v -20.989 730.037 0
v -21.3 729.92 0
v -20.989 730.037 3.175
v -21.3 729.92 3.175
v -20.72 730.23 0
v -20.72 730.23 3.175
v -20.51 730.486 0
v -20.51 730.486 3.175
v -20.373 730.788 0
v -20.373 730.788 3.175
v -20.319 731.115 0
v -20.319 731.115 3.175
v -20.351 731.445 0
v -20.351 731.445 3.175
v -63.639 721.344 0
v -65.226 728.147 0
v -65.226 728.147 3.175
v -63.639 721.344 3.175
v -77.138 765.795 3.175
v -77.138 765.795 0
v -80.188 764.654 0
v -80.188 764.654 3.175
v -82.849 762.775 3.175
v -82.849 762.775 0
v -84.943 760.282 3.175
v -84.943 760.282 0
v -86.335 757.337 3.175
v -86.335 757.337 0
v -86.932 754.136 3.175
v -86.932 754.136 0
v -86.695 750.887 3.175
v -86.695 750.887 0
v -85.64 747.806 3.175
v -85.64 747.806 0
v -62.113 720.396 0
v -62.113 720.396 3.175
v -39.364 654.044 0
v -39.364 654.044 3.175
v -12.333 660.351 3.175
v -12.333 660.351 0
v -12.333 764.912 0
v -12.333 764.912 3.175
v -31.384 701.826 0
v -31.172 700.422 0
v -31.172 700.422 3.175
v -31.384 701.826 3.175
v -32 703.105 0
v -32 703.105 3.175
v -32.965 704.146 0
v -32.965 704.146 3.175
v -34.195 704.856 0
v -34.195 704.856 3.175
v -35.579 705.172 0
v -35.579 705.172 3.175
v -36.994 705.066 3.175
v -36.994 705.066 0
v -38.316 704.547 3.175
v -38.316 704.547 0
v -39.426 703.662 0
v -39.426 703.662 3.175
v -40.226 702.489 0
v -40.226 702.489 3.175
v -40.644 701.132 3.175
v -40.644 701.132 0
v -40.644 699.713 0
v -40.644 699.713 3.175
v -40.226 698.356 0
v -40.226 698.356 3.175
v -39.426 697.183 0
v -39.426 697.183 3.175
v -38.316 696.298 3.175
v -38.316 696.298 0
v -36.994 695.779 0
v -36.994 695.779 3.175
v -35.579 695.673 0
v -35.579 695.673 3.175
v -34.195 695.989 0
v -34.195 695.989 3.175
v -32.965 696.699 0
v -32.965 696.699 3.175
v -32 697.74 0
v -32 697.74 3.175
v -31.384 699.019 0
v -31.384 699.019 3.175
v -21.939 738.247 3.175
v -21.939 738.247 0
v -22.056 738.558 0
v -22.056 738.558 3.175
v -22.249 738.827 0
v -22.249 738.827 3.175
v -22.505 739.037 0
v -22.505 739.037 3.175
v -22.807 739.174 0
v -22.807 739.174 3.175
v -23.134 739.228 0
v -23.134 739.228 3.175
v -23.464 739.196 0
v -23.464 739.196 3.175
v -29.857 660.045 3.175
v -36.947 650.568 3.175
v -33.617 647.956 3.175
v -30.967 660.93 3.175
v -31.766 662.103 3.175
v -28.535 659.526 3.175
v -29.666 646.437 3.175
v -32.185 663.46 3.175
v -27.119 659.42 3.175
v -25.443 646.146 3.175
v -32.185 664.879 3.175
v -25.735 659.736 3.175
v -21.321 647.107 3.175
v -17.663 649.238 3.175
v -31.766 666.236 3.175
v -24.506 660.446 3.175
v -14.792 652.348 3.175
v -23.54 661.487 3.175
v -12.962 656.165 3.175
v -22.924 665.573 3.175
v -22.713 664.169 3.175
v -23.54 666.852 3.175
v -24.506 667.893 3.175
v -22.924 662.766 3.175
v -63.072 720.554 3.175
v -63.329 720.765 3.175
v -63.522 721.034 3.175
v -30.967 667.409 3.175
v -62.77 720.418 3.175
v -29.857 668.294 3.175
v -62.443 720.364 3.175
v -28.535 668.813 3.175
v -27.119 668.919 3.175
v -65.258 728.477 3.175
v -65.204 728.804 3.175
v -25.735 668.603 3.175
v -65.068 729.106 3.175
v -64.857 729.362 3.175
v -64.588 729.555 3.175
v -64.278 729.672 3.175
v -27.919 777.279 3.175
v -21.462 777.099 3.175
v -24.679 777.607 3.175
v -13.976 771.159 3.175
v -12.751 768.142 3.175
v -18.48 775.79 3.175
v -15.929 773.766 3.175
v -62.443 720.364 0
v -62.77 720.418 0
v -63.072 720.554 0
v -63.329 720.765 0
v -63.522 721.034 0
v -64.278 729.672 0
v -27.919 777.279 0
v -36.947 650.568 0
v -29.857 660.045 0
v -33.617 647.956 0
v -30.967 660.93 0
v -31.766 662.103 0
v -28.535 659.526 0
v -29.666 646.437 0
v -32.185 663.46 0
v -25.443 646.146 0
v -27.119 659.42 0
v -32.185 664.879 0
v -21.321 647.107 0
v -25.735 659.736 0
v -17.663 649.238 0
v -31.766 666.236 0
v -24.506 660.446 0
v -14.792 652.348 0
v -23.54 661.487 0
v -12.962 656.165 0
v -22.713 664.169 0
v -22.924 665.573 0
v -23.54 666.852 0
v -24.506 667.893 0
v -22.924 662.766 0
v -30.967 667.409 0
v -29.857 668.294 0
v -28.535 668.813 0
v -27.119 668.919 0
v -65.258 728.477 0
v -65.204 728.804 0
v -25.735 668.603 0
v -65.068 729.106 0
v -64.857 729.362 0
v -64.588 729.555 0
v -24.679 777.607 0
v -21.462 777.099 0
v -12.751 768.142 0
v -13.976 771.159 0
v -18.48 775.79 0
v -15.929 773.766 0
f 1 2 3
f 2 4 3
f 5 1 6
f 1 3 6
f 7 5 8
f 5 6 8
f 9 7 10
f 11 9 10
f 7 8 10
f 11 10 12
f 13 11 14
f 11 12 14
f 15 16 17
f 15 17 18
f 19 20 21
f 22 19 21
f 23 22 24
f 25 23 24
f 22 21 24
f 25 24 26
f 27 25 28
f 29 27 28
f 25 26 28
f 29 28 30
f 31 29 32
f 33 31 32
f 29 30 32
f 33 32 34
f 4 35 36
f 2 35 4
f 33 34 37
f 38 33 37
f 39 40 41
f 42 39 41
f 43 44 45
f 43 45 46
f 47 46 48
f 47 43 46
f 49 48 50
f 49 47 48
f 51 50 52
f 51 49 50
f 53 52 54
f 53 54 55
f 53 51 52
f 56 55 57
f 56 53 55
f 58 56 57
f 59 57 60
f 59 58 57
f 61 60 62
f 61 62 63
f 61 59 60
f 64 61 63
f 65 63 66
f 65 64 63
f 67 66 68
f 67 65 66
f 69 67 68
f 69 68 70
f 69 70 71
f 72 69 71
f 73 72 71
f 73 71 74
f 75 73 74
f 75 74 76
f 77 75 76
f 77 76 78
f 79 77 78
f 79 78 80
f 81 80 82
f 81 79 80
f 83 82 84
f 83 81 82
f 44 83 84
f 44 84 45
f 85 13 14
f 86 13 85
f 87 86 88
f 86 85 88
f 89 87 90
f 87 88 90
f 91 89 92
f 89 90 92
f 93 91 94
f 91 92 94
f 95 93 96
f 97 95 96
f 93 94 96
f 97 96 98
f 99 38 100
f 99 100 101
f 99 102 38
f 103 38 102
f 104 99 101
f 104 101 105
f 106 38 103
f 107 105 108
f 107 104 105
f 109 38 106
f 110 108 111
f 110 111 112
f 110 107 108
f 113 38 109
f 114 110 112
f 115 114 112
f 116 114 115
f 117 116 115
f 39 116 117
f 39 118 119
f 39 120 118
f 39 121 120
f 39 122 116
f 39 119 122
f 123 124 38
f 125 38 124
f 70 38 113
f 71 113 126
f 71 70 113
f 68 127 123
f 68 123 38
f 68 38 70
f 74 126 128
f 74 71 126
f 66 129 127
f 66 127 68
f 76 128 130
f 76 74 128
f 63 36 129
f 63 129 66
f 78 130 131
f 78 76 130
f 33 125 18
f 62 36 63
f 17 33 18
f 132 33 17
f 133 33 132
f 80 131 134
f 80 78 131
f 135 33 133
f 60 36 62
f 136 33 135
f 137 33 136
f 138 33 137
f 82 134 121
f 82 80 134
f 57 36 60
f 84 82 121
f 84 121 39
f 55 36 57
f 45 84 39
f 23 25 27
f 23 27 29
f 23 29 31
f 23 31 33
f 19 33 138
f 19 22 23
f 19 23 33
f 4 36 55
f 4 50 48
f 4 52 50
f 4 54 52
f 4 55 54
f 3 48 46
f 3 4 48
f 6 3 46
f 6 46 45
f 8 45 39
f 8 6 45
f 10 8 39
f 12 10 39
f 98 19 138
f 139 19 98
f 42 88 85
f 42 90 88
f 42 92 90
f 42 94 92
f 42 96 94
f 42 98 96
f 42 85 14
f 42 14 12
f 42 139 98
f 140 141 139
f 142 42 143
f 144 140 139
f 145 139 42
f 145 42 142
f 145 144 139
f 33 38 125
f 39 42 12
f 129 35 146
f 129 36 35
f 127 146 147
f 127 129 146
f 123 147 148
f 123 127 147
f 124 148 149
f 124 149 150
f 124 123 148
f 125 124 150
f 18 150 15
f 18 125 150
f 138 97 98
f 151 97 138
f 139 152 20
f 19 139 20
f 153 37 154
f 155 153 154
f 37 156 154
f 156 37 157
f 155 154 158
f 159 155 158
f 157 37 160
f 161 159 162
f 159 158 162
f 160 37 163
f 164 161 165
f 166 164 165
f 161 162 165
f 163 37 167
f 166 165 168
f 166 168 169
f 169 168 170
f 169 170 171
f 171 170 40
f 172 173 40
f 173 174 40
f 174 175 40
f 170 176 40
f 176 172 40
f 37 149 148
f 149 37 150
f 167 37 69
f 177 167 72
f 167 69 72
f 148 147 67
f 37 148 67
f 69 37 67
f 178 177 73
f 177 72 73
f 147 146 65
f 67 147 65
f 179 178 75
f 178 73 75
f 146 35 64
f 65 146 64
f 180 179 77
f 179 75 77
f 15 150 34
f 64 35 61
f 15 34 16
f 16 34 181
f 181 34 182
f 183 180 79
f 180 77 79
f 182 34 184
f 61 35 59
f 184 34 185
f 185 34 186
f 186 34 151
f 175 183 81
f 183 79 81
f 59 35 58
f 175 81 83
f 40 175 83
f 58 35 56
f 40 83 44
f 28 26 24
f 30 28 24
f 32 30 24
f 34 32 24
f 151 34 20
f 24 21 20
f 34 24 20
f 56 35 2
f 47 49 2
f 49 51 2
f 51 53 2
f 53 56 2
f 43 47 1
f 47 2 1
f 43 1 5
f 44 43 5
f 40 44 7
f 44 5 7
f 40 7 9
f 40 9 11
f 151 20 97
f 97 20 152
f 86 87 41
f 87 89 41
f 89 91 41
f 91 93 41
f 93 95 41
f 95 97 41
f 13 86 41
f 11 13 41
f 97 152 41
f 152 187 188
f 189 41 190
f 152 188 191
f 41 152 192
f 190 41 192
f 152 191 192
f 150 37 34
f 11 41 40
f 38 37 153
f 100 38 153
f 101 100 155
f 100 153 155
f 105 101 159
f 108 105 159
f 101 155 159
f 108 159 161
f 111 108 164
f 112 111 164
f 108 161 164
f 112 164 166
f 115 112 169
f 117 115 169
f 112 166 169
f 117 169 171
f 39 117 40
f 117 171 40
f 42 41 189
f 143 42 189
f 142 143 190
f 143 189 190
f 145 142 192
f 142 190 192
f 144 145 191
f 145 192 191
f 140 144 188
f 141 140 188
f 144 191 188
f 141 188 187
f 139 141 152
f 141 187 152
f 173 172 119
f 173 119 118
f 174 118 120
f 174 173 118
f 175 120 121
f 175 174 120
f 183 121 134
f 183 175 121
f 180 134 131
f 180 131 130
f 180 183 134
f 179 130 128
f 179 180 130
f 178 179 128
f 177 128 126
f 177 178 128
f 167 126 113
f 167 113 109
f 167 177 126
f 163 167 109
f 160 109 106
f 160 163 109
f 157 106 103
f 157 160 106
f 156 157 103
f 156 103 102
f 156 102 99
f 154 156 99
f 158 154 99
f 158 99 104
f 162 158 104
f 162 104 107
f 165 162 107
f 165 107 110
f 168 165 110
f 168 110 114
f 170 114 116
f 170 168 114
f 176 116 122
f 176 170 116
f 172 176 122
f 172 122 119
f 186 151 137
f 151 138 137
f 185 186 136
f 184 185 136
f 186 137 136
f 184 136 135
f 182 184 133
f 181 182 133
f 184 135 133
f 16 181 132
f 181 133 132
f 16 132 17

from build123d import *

# Parameters (mm, degrees)
SKETCH1_R           = 4.7625
BOSS_EXTRUDE1_DEPTH = 3.175
FILLET1_R           = 1.27


with BuildPart() as part:
    # Sketch1 → Boss-Extrude1 (new body)
    with BuildSketch(Plane.XY):
        with BuildLine():
            Line((-85.640420597, 747.8061934), (-39.363598028, 654.043532069))
            ThreePointArc((-39.363598028, 654.043532069), (-23.3459714, 646.472574481), (-12.333293773, 660.350783769))
            Line((-12.333293773, 660.350783769), (-12.333293773, 764.911679744))
            ThreePointArc((-12.333293773, 764.911679744), (-17.139019283, 774.860068069), (-27.919188304, 777.279444811))
            Line((-27.919188304, 777.279444811), (-77.137872176, 765.794756196))
            ThreePointArc((-77.137872176, 765.794756196), (-85.733975533, 758.854119696), (-85.640420597, 747.8061934))
        make_face()
        with Locations((-35.934636682, 700.422451369)):
            Circle(SKETCH1_R, mode=Mode.SUBTRACT)
        with Locations((-27.475367191, 664.169477971)):
            Circle(SKETCH1_R, mode=Mode.SUBTRACT)
        Polygon((-63.350014613, 720.107666072), (-20.062836878, 730.208296933), (-22.227257777, 739.484120734), (-65.514435511, 729.383489872), align=None, mode=Mode.SUBTRACT)
    extrude(amount=BOSS_EXTRUDE1_DEPTH)

    # Fillet1
    fillet1_edges = [part.edges().sort_by_distance(p)[0] for p in [
        (-20.062836878, 730.208296933, 1.5875),
        (-22.227257777, 739.484120734, 1.5875),
        (-65.514435511, 729.383489872, 1.5875),
        (-63.350014613, 720.107666072, 1.5875),
    ]]
    fillet(fillet1_edges, radius=FILLET1_R)


solid = part.part
